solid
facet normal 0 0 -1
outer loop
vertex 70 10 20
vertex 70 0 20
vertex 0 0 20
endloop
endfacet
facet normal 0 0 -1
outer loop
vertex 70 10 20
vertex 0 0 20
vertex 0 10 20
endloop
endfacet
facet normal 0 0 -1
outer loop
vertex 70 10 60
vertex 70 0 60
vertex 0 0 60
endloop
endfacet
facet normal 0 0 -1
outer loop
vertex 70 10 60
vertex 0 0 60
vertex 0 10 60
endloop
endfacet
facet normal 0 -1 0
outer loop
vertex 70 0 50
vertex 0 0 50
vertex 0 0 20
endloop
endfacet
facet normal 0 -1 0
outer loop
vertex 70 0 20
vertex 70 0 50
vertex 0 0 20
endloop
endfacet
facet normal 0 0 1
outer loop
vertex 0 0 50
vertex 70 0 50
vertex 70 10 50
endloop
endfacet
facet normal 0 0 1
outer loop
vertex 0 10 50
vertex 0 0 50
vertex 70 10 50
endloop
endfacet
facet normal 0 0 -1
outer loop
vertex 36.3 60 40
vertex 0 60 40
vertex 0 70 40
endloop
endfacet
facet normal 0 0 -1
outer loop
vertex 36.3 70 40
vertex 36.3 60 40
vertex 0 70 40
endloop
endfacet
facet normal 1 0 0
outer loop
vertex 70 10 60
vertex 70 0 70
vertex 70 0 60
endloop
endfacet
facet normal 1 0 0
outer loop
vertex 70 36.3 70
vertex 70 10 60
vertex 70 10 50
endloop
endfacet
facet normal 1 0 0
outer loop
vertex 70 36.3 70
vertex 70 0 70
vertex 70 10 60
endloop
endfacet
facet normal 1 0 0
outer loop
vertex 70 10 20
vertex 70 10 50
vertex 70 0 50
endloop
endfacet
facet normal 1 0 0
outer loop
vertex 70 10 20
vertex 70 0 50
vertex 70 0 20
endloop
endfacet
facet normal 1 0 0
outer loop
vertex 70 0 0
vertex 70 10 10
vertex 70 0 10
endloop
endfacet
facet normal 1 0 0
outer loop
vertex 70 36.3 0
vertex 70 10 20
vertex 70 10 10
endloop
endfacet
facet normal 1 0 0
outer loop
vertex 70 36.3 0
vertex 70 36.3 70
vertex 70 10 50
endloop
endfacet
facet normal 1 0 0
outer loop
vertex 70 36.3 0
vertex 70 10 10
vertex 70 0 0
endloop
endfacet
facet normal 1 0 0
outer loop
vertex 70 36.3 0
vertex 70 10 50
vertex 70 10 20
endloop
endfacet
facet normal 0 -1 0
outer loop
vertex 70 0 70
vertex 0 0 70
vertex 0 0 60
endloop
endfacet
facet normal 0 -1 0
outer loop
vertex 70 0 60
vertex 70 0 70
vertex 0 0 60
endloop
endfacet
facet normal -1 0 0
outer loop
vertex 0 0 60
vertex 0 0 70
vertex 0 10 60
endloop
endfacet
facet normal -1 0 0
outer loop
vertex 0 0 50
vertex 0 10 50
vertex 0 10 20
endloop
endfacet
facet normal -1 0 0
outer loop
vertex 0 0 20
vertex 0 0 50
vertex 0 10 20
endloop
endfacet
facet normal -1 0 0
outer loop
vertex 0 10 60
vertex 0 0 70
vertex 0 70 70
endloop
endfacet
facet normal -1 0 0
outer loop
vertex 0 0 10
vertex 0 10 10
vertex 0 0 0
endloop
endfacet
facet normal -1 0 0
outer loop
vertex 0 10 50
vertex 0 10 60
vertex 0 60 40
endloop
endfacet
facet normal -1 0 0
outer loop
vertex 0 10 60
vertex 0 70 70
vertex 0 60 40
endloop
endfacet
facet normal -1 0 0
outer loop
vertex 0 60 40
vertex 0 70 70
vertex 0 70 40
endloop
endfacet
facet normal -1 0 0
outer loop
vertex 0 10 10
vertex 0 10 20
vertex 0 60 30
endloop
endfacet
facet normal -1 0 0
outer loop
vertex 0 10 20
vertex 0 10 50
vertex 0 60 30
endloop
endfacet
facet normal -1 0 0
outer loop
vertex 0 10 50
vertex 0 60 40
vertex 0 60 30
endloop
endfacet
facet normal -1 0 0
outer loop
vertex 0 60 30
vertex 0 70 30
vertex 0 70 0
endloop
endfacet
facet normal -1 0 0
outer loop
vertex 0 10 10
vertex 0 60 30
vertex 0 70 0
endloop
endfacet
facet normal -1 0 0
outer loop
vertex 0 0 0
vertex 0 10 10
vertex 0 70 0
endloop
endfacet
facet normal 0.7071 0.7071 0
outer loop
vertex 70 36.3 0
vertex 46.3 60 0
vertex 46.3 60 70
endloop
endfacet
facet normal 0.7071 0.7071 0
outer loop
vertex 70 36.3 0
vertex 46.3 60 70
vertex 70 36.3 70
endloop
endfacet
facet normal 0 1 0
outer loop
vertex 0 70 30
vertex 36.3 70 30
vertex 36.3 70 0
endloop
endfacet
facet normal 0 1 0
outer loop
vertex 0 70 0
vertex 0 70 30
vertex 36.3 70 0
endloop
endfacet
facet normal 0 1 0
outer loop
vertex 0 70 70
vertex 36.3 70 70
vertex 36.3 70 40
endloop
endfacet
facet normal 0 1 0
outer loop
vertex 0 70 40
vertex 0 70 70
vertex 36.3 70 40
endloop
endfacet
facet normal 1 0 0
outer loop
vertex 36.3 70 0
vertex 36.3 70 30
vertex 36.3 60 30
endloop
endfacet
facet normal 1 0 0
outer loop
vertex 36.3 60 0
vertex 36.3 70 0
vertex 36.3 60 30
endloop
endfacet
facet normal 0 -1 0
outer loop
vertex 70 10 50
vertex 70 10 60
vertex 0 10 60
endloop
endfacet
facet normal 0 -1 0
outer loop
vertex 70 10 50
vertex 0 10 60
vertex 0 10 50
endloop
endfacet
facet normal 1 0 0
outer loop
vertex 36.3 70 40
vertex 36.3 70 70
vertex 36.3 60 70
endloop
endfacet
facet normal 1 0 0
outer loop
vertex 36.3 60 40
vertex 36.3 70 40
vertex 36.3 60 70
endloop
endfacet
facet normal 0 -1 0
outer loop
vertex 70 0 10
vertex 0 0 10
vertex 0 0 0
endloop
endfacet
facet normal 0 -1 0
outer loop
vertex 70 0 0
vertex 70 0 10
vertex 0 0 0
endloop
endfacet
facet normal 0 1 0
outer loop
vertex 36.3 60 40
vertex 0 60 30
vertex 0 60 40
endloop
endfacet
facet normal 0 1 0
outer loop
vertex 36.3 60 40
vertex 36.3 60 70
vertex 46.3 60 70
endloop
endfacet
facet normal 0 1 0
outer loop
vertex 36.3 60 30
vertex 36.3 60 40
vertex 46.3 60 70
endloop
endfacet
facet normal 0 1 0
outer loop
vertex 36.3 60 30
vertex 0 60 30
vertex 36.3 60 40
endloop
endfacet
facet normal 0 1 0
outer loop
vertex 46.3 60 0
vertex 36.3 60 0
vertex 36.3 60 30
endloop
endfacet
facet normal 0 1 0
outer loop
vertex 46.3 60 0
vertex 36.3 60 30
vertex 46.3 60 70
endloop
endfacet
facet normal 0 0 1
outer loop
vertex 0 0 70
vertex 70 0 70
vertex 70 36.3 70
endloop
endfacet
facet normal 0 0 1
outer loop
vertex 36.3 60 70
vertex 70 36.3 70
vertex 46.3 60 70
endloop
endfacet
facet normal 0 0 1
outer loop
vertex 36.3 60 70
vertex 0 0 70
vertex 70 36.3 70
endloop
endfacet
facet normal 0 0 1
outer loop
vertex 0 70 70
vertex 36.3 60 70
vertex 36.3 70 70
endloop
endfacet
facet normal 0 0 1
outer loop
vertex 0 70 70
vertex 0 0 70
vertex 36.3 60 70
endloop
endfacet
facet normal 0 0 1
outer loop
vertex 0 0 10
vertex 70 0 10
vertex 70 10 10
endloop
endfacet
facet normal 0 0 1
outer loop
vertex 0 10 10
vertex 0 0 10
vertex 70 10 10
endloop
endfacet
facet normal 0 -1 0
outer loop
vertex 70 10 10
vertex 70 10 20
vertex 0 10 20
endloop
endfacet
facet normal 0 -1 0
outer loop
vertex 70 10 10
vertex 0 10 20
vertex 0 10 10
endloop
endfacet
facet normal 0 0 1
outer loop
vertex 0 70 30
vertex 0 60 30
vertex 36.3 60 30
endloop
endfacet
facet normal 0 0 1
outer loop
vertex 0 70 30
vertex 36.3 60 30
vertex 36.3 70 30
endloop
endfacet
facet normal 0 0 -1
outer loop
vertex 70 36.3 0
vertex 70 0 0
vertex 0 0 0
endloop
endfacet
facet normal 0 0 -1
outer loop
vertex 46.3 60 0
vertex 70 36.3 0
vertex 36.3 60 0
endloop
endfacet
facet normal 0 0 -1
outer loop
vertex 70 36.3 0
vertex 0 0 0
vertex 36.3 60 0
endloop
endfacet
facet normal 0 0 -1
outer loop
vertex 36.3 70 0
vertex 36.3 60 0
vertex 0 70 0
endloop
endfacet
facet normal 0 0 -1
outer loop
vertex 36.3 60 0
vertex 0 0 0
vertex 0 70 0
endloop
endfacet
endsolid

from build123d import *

# Parameters (mm, degrees)
CROQUIS1_W                 = 70
CROQUIS1_H                 = 70
SALIENTE_EXTRUIR1_DEPTH    = 70
CORTAR_EXTRUIR1_DEPTH      = 122.24355653
CORTAR_EXTRUIR1_DEPTH_BACK = 70
CROQUIS3_W                 = 10
CROQUIS3_H                 = 10
CORTAR_EXTRUIR2_DEPTH      = 70
CORTAR_EXTRUIR3_DEPTH      = 122.24355653
CORTAR_EXTRUIR3_DEPTH_BACK = 122.24355653
CORTAR_EXTRUIR4_DEPTH      = 106.44045021
CORTAR_EXTRUIR4_DEPTH_BACK = 106.44045021
CROQUIS5_W                 = 10
CROQUIS5_H                 = 10


with BuildPart() as part:
    # Croquis1 → Saliente-Extruir1 (new body)
    with BuildSketch(Plane(origin=(0, 0, 0), x_dir=(0, 0, -1), z_dir=(1, 0, 0))):
        with Locations((-35, 35)):
            Rectangle(CROQUIS1_W, CROQUIS1_H)
    extrude(amount=SALIENTE_EXTRUIR1_DEPTH)

    # Croquis2 → Cortar-Extruir1 (cut, two sides: drawn at the far end of the back side and taken through both)
    with BuildSketch(Plane.XY.offset(70).offset(-CORTAR_EXTRUIR1_DEPTH_BACK)):
        Polygon((-82.285109819, 188.585089714), (36.299979895, 70), (70, 36.299979895), (188.585089714, -82.285109819), (425.755269142, 154.885069609), (154.885069609, 425.755269142), align=None)
    extrude(amount=CORTAR_EXTRUIR1_DEPTH + CORTAR_EXTRUIR1_DEPTH_BACK, mode=Mode.SUBTRACT)

    # Croquis3 → Cortar-Extruir2 (cut)
    with BuildSketch(Plane(origin=(70, 0, 0), x_dir=(0, 0, -1), z_dir=(1, 0, 0))):
        with Locations((-15, 5)):
            Rectangle(CROQUIS3_W, CROQUIS3_H)
        with Locations((-55, 5)):
            Rectangle(CROQUIS3_W, CROQUIS3_H)
    extrude(amount=-CORTAR_EXTRUIR2_DEPTH, mode=Mode.SUBTRACT)

    # Croquis4 → Cortar-Extruir3 (cut, two sides: drawn at the far end of the back side and taken through both)
    with BuildSketch(Plane.XY.offset(70).offset(-CORTAR_EXTRUIR3_DEPTH_BACK)):
        Polygon((36.299979895, 237.704642169), (36.299979895, 70), (36.299979895, 60), (46.299979895, 60), (214.004622064, 60), (451.174801491, 297.170179428), (273.470159323, 474.874821596), align=None)
    extrude(amount=CORTAR_EXTRUIR3_DEPTH + CORTAR_EXTRUIR3_DEPTH_BACK, mode=Mode.SUBTRACT)

    # Croquis5 → Cortar-Extruir4 (cut, two sides: drawn at the far end of the back side and taken through both)
    with BuildSketch(Plane(origin=(36.299979895, 0, 0), x_dir=(0, 0, -1), z_dir=(1, 0, 0)).offset(-CORTAR_EXTRUIR4_DEPTH_BACK)):
        with Locations((-35, 65)):
            Rectangle(CROQUIS5_W, CROQUIS5_H)
    extrude(amount=CORTAR_EXTRUIR4_DEPTH + CORTAR_EXTRUIR4_DEPTH_BACK, mode=Mode.SUBTRACT)


solid = part.part
